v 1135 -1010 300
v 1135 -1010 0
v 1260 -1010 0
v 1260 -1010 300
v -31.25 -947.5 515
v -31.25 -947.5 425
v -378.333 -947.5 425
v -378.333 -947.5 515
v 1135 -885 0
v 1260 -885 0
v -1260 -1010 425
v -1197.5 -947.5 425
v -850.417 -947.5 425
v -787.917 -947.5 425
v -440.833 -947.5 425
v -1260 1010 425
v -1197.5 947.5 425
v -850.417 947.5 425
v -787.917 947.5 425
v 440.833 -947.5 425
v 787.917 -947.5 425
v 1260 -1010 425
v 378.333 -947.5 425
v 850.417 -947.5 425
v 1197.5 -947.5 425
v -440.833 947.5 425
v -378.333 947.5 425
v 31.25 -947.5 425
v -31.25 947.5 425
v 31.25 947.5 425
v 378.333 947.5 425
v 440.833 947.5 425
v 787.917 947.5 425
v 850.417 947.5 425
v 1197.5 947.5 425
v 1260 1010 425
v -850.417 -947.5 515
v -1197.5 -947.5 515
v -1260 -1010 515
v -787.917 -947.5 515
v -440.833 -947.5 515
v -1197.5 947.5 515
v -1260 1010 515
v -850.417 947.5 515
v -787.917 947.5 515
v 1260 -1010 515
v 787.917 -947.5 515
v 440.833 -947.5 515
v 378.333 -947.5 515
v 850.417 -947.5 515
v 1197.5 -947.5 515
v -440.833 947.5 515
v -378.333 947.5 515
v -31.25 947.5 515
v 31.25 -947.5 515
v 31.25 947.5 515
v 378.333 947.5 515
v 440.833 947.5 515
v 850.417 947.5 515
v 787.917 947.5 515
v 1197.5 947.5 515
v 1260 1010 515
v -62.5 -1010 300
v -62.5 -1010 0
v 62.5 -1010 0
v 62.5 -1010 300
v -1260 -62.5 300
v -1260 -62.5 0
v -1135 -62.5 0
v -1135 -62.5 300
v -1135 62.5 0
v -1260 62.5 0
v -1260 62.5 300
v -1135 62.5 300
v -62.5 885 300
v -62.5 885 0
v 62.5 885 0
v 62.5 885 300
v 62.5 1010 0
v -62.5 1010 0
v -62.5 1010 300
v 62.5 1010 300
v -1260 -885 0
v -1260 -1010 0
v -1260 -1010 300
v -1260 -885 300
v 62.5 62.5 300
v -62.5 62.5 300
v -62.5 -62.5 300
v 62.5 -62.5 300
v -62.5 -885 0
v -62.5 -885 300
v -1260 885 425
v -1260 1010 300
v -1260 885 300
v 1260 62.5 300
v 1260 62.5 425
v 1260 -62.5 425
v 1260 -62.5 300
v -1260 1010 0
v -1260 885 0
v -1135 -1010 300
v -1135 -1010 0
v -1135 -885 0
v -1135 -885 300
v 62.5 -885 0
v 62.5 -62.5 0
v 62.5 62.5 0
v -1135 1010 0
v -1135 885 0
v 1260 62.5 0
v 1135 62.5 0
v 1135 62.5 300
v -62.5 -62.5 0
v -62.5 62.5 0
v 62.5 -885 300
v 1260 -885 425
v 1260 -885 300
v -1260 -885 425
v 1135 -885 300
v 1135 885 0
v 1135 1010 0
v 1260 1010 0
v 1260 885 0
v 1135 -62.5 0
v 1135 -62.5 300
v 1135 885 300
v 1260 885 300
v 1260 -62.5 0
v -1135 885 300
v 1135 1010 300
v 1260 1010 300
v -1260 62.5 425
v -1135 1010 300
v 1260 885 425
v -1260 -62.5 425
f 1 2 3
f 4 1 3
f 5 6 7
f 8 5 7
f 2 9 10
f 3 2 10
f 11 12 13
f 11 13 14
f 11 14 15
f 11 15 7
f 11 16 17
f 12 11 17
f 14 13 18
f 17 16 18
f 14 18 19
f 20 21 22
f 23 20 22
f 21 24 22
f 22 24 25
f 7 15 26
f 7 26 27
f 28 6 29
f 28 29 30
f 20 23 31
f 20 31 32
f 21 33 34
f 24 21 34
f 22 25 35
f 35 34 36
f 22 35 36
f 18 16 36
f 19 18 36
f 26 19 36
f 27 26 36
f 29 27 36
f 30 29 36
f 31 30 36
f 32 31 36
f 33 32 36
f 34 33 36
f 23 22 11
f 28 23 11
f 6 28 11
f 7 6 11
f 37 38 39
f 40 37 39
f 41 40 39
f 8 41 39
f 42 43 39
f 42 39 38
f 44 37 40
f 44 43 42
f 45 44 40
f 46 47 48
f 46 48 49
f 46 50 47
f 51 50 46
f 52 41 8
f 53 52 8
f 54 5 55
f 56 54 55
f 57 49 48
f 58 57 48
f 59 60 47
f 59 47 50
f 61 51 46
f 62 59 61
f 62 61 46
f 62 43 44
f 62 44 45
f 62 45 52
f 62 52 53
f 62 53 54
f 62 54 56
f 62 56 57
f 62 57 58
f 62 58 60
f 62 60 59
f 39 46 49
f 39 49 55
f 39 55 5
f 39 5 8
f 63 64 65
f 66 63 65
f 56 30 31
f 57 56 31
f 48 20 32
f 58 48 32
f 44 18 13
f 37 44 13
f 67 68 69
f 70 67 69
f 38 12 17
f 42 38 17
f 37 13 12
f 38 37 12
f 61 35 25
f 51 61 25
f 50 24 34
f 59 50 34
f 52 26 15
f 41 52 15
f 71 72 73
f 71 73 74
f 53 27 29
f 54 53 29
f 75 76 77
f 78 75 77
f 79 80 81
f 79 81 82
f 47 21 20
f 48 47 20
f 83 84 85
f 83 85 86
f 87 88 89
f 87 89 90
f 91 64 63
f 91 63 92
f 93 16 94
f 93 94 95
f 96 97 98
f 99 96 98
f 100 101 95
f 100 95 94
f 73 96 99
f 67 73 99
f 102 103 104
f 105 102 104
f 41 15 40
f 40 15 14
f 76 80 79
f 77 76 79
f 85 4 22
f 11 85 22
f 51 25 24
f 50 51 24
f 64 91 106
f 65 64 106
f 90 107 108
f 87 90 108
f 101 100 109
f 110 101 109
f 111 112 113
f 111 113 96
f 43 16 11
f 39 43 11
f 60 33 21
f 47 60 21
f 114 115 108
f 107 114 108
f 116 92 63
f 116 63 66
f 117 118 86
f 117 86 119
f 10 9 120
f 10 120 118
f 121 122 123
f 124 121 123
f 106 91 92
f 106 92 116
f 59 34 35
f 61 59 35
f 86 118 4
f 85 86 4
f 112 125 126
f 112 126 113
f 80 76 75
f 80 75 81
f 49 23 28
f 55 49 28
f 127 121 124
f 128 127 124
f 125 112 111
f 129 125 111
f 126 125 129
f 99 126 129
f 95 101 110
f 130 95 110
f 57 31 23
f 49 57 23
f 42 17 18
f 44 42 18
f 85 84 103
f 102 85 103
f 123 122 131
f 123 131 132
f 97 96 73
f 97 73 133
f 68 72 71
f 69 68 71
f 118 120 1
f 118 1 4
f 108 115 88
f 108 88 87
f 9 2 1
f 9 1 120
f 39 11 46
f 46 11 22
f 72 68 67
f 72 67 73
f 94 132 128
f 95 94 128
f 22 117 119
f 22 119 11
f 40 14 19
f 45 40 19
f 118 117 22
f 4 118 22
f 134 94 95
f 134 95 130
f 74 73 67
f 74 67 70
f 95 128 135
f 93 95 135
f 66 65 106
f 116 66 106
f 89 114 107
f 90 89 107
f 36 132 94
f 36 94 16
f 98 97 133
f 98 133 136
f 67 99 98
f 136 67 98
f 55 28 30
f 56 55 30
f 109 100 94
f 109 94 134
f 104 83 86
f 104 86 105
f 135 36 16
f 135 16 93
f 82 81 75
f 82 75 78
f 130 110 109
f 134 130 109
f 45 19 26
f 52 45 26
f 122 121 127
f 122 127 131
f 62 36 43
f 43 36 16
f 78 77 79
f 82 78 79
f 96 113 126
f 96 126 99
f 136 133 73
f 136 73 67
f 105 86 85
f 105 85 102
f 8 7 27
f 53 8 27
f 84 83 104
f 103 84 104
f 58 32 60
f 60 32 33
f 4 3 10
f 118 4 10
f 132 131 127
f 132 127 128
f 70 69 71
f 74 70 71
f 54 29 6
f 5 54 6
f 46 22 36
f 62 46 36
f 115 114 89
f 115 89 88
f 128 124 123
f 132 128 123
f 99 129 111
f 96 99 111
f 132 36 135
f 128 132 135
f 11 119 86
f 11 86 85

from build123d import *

# Parameters (mm, degrees)
F0_W     = 125
F0_H     = 125
F1_DEPTH = 300
F2_W     = 125
F2_H     = 125
F3_DEPTH = 2520
F4_W     = 62.5
F4_H     = 1895
F4_H_2   = 1832.5
F4_H_3   = 62.5
F5_DEPTH = 90


with BuildPart() as f1:
    # F0 (on Top) → F1 (new body)
    with BuildSketch(Plane.XY):
        with Locations((-1197.5, 947.5)):
            Rectangle(F0_W, F0_H)
        with Locations((-1197.5, 0)):
            Rectangle(F0_W, F0_H)
        with Locations((-1197.5, -947.5)):
            Rectangle(F0_W, F0_H)
        with Locations((0, 947.5)):
            Rectangle(F0_W, F0_H)
        Rectangle(F0_W, F0_H)
        with Locations((0, -947.5)):
            Rectangle(F0_W, F0_H)
        with Locations((1197.5, 947.5)):
            Rectangle(F0_W, F0_H)
        with Locations((1197.5, 0)):
            Rectangle(F0_W, F0_H)
        with Locations((1197.5, -947.5)):
            Rectangle(F0_W, F0_H)
    extrude(amount=F1_DEPTH)


with BuildPart() as f3:
    # F2 (on face) → F3 (new body, through all)
    with BuildSketch(Plane(origin=(-1260, 0, 0), x_dir=(0, -1, 0), z_dir=(-1, 0, 0))):
        with Locations((-947.5, 362.5)):
            Rectangle(F2_W, F2_H)
        with Locations((0, 362.5)):
            Rectangle(F2_W, F2_H)
        with Locations((947.5, 362.5)):
            Rectangle(F2_W, F2_H)
    extrude(amount=-F3_DEPTH)


with BuildPart() as f5:
    # F4 (on face) → F5 (new body)
    with BuildSketch(Plane.XY.offset(425)):
        Polygon((-810, 1010), (-1260, 1010), (-1260, 947.5), (-1197.5, 947.5), (-850.416667, 947.5), (-787.916667, 947.5), (-440.833333, 947.5), (-378.333333, 947.5), (-31.25, 947.5), (31.25, 947.5), (378.333333, 947.5), (440.833333, 947.5), (787.916667, 947.5), (850.416667, 947.5), (1197.5, 947.5), (1260, 947.5), (1260, 1010), align=None)
        with Locations((-1228.75, 0)):
            Rectangle(F4_W, F4_H)
        Polygon((-1197.5, -947.5), (-1260, -947.5), (-1260, -1010), (1260, -1010), (1260, -947.5), (1197.5, -947.5), (850.416667, -947.5), (787.916667, -947.5), (440.833333, -947.5), (378.333333, -947.5), (31.25, -947.5), (-31.25, -947.5), (-378.333333, -947.5), (-440.833333, -947.5), (-787.916667, -947.5), (-850.416667, -947.5), align=None)
        with Locations((1228.75, 0)):
            Rectangle(F4_W, F4_H)
        with Locations((-819.166667, -31.25)):
            Rectangle(F4_W, F4_H_2)
        with Locations((-409.583333, -31.25)):
            Rectangle(F4_W, F4_H_2)
        with Locations((0, -31.25)):
            Rectangle(F4_W, F4_H_2)
        with Locations((409.583333, -31.25)):
            Rectangle(F4_W, F4_H_2)
        with Locations((819.166667, -31.25)):
            Rectangle(F4_W, F4_H_2)
        with Locations((1228.75, -31.25)):
            Rectangle(F4_W, F4_H_2)
        with Locations((-819.166667, 916.25)):
            Rectangle(F4_W, F4_H_3)
        with Locations((-409.583333, 916.25)):
            Rectangle(F4_W, F4_H_3)
        with Locations((0, 916.25)):
            Rectangle(F4_W, F4_H_3)
        with Locations((409.583333, 916.25)):
            Rectangle(F4_W, F4_H_3)
        with Locations((819.166667, 916.25)):
            Rectangle(F4_W, F4_H_3)
        with Locations((1228.75, 916.25)):
            Rectangle(F4_W, F4_H_3)
    extrude(amount=F5_DEPTH)


solid = Compound([f1.part, f3.part, f5.part])
